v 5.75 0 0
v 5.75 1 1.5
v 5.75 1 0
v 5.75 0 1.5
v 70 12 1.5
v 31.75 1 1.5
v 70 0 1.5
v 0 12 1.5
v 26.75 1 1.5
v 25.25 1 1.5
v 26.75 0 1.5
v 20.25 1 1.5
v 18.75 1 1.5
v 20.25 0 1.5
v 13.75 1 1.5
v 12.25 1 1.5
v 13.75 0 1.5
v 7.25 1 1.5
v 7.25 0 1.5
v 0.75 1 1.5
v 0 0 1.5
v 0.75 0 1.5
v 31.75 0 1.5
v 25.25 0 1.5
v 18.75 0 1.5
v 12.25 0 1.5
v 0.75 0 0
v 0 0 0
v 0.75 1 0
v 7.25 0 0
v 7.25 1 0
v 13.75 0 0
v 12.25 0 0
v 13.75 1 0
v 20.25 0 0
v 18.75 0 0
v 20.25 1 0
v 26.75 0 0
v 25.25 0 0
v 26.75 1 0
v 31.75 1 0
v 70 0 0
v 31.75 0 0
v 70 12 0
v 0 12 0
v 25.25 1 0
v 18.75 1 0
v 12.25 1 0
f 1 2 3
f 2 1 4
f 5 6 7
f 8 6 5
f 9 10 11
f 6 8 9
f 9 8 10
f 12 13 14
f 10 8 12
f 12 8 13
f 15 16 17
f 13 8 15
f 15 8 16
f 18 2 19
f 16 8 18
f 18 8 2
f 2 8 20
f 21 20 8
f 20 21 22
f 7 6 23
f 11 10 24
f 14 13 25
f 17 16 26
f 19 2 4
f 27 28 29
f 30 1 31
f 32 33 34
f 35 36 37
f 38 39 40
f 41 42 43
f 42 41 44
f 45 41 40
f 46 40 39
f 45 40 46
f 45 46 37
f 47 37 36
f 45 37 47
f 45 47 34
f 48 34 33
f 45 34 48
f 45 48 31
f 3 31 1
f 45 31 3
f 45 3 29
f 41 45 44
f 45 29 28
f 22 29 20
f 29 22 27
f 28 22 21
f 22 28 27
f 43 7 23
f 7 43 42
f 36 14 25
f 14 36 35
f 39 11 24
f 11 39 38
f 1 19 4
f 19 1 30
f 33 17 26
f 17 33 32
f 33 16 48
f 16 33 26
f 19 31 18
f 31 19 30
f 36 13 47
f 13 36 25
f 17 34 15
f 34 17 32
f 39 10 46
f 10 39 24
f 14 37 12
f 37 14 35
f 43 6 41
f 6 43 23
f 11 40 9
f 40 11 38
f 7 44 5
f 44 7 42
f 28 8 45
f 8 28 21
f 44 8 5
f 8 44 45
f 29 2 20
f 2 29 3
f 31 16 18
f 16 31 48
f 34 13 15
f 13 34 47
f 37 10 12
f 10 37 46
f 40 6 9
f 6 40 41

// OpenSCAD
// 10-well comb for agarose gel casting, printed lying flat
// Units: mm

$fn = 64;

// --- Dimensions ---
plate_t      = 1.5;     // plate thickness (Z)
spine_len    = 70;      // spine length (X)
spine_wid    = 12;      // spine width (Y)
tooth_count  = 10;      // number of teeth
tooth_w      = 5.0;     // tooth width (X)
tooth_l      = 12;      // tooth length (Y)
tooth_gap    = 1.5;     // gap between teeth (X)
eps          = 0.5;     // cutter overshoot past faces

// Derived
row_start = -(tooth_count * tooth_w + (tooth_count - 1) * tooth_gap) / 2; // first tooth X

difference() {
    union() {
        // Spine
        translate([0, 0, 0])
            cube([spine_len, spine_wid, plate_t]);
        // Teeth
        for (i = [0 : tooth_count - 1])
            translate([row_start + i * (tooth_w + tooth_gap), -spine_wid, 0])
                cube([tooth_w, tooth_l, plate_t]);
    }
    // Cut the teeth out from the +Y side, leaving the overhangs
    for (i = [0 : tooth_count - 1])
        translate([row_start + i * (tooth_w + tooth_gap), -spine_wid, -eps])
            cube([tooth_w, tooth_l + 2 * eps, plate_t + 2 * eps]);
}
